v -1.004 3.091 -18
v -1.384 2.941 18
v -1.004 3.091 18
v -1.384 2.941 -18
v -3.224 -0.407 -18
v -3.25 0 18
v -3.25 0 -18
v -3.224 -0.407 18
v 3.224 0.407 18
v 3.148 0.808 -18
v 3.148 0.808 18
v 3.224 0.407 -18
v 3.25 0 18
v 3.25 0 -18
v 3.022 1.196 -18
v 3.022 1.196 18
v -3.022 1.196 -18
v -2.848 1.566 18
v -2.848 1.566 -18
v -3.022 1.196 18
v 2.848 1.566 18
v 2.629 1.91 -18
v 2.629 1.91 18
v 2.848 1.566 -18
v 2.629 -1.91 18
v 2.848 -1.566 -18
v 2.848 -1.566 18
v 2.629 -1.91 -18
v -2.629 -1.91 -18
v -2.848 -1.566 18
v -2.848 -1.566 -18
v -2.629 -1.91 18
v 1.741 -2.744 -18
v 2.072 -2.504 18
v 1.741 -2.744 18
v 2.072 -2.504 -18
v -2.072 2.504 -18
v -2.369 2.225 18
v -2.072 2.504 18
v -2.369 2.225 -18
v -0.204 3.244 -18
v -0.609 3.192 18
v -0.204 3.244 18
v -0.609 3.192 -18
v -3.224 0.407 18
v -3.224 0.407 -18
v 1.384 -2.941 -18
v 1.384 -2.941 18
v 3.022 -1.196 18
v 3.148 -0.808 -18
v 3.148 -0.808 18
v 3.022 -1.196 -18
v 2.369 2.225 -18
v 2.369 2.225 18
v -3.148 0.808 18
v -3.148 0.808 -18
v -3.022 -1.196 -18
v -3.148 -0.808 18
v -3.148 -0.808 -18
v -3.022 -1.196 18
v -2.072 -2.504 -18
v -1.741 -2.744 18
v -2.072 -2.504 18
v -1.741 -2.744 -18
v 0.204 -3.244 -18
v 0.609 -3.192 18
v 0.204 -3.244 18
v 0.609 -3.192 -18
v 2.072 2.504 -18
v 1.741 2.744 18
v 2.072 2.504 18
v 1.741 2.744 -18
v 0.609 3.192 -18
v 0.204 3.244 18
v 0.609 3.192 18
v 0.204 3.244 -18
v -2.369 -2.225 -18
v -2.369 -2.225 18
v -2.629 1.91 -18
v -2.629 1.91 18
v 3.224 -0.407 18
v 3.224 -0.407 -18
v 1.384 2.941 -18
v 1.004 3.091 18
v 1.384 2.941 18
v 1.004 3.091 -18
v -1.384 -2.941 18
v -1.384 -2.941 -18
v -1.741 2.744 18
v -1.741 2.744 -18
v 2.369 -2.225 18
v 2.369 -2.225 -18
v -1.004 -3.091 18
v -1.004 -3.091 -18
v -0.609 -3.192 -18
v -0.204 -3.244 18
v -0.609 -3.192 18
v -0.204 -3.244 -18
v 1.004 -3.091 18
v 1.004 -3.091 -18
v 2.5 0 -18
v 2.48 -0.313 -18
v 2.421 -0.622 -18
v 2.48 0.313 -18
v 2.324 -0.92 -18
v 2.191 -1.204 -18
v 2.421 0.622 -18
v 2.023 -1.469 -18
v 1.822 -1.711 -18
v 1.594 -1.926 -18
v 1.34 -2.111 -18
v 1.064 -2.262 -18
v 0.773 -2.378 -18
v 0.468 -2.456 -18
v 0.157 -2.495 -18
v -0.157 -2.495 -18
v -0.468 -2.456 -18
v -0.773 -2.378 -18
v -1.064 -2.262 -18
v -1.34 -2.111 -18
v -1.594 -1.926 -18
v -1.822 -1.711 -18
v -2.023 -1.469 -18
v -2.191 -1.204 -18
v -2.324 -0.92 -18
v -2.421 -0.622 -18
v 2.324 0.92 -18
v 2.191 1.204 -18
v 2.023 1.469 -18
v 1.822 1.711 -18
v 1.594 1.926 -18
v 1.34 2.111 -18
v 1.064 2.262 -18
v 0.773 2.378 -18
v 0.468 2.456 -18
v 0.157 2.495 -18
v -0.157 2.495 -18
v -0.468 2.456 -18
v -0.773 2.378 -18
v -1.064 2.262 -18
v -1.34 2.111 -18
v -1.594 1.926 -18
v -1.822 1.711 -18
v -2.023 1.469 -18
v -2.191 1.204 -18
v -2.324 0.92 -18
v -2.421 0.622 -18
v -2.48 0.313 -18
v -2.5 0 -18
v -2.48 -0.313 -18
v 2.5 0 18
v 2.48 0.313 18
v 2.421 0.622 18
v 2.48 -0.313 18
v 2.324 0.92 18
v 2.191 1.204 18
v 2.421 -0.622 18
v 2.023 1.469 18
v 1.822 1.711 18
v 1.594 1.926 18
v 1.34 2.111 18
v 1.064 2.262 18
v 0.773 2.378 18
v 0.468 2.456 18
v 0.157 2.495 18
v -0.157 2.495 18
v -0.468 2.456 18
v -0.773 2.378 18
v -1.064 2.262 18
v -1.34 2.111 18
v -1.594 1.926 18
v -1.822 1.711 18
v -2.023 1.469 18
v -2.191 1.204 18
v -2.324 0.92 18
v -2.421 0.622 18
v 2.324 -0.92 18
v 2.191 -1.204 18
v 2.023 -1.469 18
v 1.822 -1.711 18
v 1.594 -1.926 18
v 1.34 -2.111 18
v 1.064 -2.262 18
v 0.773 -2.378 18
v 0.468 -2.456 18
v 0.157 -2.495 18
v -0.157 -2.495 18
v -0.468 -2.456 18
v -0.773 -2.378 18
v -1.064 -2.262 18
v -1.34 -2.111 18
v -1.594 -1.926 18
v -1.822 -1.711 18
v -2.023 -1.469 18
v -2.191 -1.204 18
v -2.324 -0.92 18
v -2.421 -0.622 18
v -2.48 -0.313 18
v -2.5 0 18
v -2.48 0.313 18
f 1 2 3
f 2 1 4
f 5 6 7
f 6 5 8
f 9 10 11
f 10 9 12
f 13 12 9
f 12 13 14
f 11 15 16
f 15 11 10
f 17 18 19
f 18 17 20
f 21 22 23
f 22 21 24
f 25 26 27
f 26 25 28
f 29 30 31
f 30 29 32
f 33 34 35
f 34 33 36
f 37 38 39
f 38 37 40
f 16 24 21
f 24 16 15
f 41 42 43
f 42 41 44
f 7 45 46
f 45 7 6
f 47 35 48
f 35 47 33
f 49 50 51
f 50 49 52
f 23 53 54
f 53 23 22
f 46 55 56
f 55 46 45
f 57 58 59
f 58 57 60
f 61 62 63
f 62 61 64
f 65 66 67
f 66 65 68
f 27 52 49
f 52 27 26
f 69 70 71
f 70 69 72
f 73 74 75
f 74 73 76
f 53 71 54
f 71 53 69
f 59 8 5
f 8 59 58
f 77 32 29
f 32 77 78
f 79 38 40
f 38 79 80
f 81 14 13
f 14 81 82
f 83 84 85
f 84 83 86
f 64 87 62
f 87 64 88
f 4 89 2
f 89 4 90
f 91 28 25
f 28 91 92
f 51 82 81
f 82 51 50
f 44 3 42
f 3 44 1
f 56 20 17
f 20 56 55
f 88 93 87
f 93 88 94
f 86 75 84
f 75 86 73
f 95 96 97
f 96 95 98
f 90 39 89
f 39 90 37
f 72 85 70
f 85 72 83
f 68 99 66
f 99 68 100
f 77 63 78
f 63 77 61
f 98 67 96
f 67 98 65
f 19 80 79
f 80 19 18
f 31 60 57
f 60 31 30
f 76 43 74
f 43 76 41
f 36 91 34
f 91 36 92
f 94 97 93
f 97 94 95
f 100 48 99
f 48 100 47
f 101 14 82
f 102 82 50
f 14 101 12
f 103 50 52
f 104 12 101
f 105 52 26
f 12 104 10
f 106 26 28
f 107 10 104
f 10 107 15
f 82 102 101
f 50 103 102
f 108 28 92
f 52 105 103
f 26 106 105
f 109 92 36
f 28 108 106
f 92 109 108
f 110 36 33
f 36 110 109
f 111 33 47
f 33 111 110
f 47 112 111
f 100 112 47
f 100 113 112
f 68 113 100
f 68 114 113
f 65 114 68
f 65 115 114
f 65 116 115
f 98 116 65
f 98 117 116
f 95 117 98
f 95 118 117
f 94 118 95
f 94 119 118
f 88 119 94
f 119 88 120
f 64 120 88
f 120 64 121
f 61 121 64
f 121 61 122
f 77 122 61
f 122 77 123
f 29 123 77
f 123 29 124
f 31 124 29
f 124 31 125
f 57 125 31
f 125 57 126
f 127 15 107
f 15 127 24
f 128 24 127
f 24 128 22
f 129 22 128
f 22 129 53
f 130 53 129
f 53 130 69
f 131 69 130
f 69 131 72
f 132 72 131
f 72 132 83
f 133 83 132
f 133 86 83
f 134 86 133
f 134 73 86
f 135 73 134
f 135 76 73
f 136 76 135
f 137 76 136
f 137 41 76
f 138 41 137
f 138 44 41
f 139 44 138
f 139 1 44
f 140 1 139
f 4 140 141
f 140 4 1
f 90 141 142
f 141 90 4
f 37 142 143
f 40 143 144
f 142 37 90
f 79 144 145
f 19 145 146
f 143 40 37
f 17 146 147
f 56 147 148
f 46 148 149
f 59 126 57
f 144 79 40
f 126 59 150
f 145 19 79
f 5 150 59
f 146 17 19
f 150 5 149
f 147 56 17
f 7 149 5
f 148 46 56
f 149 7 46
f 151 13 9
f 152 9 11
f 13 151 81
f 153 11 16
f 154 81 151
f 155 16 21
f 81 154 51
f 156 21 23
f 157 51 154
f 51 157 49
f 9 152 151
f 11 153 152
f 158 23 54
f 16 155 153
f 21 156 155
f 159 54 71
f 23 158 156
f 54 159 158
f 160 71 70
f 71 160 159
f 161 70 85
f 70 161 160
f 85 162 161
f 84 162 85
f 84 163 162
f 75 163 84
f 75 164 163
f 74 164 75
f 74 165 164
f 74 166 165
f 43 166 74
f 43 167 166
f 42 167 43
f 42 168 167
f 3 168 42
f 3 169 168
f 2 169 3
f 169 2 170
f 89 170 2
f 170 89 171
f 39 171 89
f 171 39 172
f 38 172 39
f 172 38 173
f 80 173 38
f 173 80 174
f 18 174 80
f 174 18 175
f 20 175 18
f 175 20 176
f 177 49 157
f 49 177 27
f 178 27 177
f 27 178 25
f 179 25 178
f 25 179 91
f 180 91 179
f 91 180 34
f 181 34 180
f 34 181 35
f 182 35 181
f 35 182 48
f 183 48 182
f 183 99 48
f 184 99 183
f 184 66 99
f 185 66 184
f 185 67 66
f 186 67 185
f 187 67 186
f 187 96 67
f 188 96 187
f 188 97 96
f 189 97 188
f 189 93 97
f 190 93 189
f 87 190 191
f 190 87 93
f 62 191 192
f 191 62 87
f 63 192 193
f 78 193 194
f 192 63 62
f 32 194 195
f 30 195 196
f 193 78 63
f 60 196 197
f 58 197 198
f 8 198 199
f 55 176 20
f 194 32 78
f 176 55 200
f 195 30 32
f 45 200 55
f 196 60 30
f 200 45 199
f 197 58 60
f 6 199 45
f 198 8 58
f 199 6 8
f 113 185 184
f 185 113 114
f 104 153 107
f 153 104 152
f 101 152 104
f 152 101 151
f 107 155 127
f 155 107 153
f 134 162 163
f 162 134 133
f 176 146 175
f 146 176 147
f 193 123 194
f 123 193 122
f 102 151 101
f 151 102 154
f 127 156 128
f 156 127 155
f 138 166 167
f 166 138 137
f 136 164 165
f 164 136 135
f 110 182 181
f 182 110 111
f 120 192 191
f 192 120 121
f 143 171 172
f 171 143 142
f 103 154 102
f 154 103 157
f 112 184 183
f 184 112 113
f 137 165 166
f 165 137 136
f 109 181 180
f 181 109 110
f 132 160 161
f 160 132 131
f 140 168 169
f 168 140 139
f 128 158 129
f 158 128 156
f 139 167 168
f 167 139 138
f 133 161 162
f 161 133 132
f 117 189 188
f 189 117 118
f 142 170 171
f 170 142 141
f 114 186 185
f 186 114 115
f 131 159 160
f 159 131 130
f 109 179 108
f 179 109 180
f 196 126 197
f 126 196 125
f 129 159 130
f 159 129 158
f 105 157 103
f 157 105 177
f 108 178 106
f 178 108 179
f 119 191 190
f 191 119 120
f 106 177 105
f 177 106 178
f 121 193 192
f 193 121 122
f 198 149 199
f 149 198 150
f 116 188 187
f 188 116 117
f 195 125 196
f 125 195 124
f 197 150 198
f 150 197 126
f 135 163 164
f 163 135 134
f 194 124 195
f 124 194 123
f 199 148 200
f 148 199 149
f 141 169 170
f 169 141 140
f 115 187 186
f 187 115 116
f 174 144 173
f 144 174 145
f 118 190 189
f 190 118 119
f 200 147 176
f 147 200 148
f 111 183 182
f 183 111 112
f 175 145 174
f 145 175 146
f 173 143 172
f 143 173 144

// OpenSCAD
$fn = 50;


difference() {
	union() {
		translate(v = [0, 0, -18.0000000000]) {
			cylinder(h = 36, r = 3.2500000000);
		}
	}
	union() {
		translate(v = [0, 0, -100.0000000000]) {
			cylinder(h = 200, r = 2.5000000000);
		}
	}
}
